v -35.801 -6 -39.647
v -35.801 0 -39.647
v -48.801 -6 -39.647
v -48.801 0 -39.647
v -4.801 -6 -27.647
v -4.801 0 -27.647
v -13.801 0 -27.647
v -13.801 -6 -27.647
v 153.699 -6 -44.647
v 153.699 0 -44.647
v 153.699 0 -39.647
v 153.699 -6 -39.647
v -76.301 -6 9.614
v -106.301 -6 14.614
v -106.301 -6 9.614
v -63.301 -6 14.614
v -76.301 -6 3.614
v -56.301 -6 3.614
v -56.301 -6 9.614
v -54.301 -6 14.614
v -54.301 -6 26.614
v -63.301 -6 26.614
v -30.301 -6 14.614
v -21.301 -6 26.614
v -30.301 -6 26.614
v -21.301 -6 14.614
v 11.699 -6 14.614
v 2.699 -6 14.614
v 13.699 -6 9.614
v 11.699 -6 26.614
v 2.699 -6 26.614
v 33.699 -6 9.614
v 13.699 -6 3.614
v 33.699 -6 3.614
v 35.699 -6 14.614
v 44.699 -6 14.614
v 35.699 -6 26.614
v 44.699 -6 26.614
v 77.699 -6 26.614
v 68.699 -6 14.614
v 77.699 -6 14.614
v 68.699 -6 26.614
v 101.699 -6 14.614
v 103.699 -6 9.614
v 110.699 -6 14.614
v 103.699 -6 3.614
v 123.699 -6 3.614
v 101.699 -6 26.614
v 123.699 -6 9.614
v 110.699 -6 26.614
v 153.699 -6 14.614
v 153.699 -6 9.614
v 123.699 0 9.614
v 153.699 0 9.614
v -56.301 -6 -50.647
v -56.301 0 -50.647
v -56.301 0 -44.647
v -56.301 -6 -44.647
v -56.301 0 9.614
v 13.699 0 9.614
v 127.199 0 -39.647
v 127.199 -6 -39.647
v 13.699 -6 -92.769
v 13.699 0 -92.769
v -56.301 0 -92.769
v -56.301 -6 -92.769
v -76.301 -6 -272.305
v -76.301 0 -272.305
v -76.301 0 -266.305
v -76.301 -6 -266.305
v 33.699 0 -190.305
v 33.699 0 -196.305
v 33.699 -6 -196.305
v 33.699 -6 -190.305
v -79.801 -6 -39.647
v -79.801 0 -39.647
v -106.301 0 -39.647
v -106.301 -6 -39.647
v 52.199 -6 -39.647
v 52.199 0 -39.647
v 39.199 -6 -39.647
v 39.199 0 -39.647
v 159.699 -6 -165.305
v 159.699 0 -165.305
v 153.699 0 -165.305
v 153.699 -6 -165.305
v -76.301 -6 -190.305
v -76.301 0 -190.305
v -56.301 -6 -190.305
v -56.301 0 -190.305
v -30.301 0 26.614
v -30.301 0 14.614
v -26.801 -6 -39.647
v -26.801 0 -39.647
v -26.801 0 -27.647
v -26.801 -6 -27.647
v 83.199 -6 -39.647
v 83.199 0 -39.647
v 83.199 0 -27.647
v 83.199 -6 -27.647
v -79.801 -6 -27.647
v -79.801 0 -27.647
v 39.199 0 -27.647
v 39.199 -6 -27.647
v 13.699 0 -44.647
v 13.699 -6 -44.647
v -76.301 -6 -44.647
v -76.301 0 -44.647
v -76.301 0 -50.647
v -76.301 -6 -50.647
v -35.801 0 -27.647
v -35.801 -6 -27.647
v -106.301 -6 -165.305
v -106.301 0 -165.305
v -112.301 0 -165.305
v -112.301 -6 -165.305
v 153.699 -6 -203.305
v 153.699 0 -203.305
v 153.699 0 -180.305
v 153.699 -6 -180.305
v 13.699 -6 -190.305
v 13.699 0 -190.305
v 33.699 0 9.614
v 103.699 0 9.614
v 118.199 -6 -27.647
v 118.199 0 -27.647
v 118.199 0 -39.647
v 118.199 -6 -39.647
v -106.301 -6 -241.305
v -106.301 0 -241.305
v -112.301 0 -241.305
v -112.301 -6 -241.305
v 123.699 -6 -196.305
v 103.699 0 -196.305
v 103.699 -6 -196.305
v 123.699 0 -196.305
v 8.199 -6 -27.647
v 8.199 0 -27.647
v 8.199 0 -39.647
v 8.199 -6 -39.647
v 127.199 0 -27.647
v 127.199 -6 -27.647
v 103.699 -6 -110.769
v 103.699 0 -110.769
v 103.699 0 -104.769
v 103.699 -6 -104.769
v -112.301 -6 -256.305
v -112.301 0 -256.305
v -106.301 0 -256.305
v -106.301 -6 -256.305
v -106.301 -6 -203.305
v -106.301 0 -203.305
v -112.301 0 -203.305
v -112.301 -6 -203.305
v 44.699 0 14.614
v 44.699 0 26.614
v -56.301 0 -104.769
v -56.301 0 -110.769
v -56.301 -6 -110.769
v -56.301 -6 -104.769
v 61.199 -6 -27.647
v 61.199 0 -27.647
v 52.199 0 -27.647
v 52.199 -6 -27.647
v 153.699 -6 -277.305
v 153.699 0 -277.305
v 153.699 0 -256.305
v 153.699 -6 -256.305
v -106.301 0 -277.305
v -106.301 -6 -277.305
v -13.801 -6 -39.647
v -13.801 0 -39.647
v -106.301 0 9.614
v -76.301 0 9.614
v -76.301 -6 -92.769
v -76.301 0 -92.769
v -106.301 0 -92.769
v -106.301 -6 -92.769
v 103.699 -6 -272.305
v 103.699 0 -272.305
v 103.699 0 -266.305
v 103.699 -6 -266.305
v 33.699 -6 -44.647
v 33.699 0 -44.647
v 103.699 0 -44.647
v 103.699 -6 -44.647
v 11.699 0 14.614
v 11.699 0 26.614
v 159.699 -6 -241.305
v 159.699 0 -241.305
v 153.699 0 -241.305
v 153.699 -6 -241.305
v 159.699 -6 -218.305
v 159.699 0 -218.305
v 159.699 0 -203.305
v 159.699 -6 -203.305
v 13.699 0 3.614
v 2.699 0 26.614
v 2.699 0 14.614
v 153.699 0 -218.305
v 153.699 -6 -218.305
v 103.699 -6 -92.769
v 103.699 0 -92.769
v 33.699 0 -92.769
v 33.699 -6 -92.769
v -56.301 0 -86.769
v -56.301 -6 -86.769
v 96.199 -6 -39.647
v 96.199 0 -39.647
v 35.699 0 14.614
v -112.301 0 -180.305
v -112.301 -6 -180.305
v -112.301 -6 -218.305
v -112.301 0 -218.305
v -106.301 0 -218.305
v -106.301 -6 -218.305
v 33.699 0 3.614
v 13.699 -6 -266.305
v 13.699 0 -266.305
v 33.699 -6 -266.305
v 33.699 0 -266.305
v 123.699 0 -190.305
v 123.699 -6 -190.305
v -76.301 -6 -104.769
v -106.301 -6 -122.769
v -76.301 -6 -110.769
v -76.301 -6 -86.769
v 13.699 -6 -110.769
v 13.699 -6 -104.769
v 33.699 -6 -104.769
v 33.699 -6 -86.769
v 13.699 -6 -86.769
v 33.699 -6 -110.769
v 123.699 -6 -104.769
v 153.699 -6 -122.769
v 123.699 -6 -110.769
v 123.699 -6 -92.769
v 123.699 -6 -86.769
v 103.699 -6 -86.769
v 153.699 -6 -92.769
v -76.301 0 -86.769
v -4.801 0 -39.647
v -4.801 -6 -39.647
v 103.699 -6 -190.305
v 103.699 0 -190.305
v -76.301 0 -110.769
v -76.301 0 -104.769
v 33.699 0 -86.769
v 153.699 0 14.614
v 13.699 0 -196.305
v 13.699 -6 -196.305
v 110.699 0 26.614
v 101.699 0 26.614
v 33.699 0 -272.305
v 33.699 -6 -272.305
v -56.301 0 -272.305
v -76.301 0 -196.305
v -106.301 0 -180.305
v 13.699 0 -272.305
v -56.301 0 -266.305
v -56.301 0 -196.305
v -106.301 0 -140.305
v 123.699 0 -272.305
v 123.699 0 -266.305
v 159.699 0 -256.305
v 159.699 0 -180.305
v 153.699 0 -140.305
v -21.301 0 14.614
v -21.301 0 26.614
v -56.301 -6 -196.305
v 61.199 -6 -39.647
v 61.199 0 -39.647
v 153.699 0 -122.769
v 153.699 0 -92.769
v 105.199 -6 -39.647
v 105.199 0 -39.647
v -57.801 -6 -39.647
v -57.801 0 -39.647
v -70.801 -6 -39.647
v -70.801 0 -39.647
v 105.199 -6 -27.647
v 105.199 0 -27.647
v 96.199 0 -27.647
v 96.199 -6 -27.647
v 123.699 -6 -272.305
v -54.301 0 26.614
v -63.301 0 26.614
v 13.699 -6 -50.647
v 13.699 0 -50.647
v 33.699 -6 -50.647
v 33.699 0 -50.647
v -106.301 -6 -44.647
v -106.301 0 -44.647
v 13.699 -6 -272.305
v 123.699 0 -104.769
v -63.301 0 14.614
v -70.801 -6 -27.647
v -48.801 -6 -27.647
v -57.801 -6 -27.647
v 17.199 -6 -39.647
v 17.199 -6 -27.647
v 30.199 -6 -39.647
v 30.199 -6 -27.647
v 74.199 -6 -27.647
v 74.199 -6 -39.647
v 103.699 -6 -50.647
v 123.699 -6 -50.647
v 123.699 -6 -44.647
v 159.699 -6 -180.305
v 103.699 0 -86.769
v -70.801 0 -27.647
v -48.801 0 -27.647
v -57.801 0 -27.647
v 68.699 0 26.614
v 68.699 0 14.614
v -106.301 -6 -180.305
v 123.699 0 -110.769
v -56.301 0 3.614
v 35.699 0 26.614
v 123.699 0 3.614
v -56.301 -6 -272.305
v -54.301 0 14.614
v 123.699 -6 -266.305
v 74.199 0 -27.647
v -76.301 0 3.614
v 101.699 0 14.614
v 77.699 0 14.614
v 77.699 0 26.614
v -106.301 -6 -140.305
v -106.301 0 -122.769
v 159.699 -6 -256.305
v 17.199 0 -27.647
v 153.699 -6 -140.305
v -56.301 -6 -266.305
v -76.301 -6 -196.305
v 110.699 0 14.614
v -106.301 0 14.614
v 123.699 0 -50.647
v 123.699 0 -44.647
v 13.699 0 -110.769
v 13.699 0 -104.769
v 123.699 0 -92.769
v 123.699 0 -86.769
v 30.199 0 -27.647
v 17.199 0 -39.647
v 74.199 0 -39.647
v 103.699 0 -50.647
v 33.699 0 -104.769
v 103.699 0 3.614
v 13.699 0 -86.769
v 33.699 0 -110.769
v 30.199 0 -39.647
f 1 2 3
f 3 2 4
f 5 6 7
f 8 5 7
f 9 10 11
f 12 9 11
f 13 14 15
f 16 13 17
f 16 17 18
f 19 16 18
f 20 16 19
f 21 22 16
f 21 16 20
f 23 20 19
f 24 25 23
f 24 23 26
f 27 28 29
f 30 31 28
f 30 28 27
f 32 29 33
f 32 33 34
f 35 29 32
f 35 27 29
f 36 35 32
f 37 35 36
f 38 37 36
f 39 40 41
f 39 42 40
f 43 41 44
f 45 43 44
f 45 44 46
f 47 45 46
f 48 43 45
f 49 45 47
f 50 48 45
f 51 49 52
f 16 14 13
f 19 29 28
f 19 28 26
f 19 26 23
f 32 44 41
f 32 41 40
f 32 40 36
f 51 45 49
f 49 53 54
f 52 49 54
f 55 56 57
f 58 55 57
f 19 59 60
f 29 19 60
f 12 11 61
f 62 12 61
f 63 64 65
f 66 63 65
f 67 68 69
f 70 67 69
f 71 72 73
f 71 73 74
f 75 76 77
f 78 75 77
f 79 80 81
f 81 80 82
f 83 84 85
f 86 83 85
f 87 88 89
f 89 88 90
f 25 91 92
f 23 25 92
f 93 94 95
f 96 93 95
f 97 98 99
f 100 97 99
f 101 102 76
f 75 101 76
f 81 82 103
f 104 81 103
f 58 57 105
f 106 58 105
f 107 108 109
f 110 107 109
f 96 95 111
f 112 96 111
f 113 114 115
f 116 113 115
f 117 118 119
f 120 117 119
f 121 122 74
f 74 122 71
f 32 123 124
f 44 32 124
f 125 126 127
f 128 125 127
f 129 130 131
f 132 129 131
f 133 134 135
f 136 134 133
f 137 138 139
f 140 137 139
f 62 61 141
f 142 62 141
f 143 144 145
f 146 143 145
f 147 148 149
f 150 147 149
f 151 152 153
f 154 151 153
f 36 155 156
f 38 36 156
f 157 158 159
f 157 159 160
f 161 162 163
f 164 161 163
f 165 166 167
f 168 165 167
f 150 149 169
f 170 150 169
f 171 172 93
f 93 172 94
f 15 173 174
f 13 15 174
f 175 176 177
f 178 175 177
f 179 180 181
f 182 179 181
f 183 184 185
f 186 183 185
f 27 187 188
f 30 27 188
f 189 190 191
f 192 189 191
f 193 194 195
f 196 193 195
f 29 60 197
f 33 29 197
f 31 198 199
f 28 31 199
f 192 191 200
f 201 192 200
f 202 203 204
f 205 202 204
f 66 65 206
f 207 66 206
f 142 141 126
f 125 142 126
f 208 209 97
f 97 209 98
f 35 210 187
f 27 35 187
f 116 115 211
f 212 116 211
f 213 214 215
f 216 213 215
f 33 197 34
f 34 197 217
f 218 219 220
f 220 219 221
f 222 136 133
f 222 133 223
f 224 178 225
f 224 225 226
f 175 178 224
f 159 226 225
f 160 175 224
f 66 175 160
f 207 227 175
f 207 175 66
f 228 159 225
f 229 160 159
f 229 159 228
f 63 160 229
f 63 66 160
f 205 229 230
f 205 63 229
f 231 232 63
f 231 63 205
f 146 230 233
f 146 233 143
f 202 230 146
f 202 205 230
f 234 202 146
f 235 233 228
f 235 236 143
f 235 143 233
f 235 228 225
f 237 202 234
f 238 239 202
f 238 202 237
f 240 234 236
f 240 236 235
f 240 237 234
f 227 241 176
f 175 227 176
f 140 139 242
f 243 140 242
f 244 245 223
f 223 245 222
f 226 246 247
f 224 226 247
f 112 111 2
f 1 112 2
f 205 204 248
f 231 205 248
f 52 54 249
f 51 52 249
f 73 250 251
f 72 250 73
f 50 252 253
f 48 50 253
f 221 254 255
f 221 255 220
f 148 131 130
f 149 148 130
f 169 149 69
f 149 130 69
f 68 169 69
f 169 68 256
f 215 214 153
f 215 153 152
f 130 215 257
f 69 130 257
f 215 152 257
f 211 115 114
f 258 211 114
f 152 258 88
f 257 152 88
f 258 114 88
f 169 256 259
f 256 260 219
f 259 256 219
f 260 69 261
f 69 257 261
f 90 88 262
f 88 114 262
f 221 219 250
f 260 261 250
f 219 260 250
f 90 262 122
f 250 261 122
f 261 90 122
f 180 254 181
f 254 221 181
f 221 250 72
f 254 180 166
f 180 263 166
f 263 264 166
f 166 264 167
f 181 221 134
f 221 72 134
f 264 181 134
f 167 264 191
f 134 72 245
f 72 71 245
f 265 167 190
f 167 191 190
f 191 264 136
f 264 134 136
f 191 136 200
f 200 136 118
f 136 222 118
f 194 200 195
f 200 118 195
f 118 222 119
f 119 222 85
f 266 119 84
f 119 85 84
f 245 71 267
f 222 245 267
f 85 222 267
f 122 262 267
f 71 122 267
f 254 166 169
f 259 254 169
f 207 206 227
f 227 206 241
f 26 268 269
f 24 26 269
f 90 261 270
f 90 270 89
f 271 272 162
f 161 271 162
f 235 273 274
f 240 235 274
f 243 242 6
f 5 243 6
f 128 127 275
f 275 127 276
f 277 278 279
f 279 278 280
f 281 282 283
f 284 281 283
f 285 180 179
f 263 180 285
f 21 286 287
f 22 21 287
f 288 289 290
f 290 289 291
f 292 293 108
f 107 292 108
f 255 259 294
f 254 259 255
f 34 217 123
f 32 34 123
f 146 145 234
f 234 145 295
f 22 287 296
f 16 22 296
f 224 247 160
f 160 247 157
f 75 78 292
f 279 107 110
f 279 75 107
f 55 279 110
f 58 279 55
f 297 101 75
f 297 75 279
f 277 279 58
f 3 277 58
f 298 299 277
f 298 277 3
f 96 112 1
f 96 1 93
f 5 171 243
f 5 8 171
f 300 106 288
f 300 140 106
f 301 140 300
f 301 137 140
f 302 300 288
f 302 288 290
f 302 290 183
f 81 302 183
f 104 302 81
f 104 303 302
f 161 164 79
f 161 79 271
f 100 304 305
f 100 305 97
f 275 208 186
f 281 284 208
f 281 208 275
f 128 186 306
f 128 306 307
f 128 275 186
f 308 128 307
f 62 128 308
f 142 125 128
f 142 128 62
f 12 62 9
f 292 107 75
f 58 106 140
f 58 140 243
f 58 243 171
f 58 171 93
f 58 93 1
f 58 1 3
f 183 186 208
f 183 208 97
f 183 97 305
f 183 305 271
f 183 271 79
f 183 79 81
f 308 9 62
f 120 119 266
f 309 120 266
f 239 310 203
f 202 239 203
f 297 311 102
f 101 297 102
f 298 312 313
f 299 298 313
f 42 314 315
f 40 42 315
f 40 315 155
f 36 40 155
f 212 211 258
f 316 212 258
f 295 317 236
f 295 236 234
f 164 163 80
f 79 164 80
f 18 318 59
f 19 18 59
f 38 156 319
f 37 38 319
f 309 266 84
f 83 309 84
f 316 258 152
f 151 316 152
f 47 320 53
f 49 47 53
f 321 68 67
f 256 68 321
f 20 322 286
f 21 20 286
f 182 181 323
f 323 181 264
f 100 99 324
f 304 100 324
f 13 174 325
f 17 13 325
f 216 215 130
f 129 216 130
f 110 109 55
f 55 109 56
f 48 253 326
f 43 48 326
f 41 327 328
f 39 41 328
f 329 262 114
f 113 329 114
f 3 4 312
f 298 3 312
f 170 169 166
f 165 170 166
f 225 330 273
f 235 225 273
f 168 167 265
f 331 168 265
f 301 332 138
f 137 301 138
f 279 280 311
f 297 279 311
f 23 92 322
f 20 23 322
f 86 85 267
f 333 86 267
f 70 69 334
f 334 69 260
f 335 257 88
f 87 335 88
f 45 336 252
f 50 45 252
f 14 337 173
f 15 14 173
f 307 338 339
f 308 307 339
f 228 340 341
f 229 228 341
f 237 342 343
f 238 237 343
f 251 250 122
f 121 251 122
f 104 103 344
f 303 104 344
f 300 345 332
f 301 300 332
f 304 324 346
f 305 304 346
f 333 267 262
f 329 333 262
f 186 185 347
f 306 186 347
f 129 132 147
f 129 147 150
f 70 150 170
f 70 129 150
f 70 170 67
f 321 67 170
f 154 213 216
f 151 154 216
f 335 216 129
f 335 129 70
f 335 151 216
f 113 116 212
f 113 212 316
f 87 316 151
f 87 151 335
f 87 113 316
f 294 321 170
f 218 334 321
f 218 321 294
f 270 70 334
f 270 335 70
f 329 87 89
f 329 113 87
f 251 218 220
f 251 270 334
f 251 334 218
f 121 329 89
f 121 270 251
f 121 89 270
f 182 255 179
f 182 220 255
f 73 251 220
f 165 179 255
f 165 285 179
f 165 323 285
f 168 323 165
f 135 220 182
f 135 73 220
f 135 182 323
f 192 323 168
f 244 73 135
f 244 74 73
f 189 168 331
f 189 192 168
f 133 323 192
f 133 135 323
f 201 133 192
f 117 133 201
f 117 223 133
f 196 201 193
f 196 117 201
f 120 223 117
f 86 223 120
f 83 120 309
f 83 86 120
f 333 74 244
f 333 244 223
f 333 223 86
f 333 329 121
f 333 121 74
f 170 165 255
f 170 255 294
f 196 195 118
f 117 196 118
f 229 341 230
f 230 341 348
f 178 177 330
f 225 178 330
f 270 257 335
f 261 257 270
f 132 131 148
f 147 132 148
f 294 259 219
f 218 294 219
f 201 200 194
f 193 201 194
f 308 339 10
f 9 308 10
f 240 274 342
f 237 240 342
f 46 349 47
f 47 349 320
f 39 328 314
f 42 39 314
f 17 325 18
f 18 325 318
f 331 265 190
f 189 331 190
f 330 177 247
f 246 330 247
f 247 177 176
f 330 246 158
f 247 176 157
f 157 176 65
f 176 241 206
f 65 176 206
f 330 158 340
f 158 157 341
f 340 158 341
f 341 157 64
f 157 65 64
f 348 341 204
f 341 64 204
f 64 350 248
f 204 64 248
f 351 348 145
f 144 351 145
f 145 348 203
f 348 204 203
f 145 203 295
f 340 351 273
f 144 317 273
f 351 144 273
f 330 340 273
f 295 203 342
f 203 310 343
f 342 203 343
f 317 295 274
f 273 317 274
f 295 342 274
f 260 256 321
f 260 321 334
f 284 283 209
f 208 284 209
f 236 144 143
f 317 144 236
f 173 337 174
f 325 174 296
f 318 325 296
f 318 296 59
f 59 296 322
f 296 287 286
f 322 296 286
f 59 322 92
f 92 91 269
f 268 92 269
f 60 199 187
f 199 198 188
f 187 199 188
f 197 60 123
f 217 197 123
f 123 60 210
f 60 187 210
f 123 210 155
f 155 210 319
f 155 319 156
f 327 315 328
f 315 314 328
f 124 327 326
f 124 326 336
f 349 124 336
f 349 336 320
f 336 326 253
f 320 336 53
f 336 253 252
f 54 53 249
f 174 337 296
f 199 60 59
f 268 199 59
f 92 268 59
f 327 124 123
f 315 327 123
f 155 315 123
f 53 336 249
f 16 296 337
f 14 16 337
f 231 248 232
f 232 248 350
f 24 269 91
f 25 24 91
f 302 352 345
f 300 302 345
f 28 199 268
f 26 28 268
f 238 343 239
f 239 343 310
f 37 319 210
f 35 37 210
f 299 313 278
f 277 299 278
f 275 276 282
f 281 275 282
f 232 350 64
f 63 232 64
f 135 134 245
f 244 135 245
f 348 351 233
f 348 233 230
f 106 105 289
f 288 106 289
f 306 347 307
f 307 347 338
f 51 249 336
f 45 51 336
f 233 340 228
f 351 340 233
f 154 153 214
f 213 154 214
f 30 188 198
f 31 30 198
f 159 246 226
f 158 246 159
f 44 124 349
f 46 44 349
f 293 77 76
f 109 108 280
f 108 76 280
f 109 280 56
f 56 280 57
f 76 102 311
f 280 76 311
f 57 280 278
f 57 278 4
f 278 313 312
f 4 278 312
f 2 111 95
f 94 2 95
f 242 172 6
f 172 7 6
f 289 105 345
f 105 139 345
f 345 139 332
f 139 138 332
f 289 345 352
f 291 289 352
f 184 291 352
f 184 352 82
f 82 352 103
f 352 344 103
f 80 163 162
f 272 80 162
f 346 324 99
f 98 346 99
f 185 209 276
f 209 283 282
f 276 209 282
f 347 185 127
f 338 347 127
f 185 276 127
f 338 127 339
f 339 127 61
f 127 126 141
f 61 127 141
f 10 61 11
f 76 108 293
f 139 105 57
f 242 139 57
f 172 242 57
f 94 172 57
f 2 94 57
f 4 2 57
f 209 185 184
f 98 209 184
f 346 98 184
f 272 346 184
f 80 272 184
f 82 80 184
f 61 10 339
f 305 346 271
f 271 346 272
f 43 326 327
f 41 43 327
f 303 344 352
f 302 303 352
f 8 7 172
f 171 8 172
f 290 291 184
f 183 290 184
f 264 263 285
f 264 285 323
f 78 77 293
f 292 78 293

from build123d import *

# Parameters (mm, degrees)
F0_W     = 20
F0_H     = 6
F1_DEPTH = 6
F2_DEPTH = 6
F3_DEPTH = 6
F4_DEPTH = 6


# Not quite as in the source:
# - a feature names something its author has since deleted; it is built from what else it names


with BuildPart() as f1:
    # F0 (on Front) → F1 (new body)
    with BuildSketch(Plane.XZ):
        Polygon((153.699216228, -140.3053558618), (-106.300783772, -140.3053558618), (-106.300783772, -165.3053558618), (-112.300783772, -165.3053558618), (-112.300783772, -180.3053558618), (-106.300783772, -180.3053558618), (-106.300783772, -203.3053558618), (-112.300783772, -203.3053558618), (-112.300783772, -218.3053558618), (-106.300783772, -218.3053558618), (-106.300783772, -241.3053558618), (-112.300783772, -241.3053558618), (-112.300783772, -256.3053558618), (-106.300783772, -256.3053558618), (-106.300783772, -277.3053558618), (153.699216228, -277.3053558618), (153.699216228, -256.3053558618), (159.699216228, -256.3053558618), (159.699216228, -241.3053558618), (153.699216228, -241.3053558618), (153.699216228, -218.3053558618), (159.699216228, -218.3053558618), (159.699216228, -203.3053558618), (153.699216228, -203.3053558618), (153.699216228, -180.3053558618), (159.699216228, -180.3053558618), (159.699216228, -165.3053558618), (153.699216228, -165.3053558618), align=None)
        with Locations((-66.300783772, -269.3053558618)):
            Rectangle(F0_W, F0_H, mode=Mode.SUBTRACT)
        with Locations((-66.300783772, -193.3053558618)):
            Rectangle(F0_W, F0_H, mode=Mode.SUBTRACT)
        with Locations((23.699216228, -193.3053558618)):
            Rectangle(F0_W, F0_H, mode=Mode.SUBTRACT)
        with Locations((23.699216228, -269.3053558618)):
            Rectangle(F0_W, F0_H, mode=Mode.SUBTRACT)
        with Locations((113.699216228, -269.3053558618)):
            Rectangle(F0_W, F0_H, mode=Mode.SUBTRACT)
        with Locations((113.699216228, -193.3053558618)):
            Rectangle(F0_W, F0_H, mode=Mode.SUBTRACT)
    extrude(amount=F1_DEPTH)


with BuildPart() as f2:
    # F0 (on Front) → F2 (new body)
    with BuildSketch(Plane.XZ):
        Polygon((-76.300783772, -92.7685894072), (-106.300783772, -92.7685894072), (-106.300783772, -122.7685894072), (153.699216228, -122.7685894072), (153.699216228, -92.7685894072), (123.699216228, -92.7685894072), (123.699216228, -86.7685894072), (103.699216228, -86.7685894072), (103.699216228, -92.7685894072), (33.699216228, -92.7685894072), (33.699216228, -86.7685894072), (13.699216228, -86.7685894072), (13.699216228, -92.7685894072), (-56.300783772, -92.7685894072), (-56.300783772, -86.7685894072), (-76.300783772, -86.7685894072), align=None)
        with Locations((-66.300783772, -107.7685894072)):
            Rectangle(F0_W, F0_H, mode=Mode.SUBTRACT)
        with Locations((23.699216228, -107.7685894072)):
            Rectangle(F0_W, F0_H, mode=Mode.SUBTRACT)
        with Locations((113.699216228, -107.7685894072)):
            Rectangle(F0_W, F0_H, mode=Mode.SUBTRACT)
    extrude(amount=F2_DEPTH)


with BuildPart() as f3:
    # F0 (on Front) → F3 (new body)
    with BuildSketch(Plane.XZ):
        Polygon((-63.300783772, 26.6136842668), (-63.300783772, 14.6136842668), (-106.300783772, 14.6136842668), (-106.300783772, 9.6136842668), (-76.300783772, 9.6136842668), (-76.300783772, 3.6136842668), (-56.300783772, 3.6136842668), (-56.300783772, 9.6136842668), (13.699216228, 9.6136842668), (13.699216228, 3.6136842668), (33.699216228, 3.6136842668), (33.699216228, 9.6136842668), (103.699216228, 9.6136842668), (103.699216228, 3.6136842668), (123.699216228, 3.6136842668), (123.699216228, 9.6136842668), (153.699216228, 9.6136842668), (153.699216228, 14.6136842668), (134.699216228, 14.6136842668), (110.699216228, 14.6136842668), (110.699216228, 26.6136842668), (101.699216228, 26.6136842668), (101.699216228, 14.6136842668), (77.699216228, 14.6136842668), (77.699216228, 26.6136842668), (68.699216228, 26.6136842668), (68.699216228, 14.6136842668), (44.699216228, 14.6136842668), (44.699216228, 26.6136842668), (35.699216228, 26.6136842668), (35.699216228, 14.6136842668), (11.699216228, 14.6136842668), (11.699216228, 26.6136842668), (2.699216228, 26.6136842668), (2.699216228, 14.6136842668), (-21.300783772, 14.6136842668), (-21.300783772, 26.6136842668), (-30.300783772, 26.6136842668), (-30.300783772, 14.6136842668), (-54.300783772, 14.6136842668), (-54.300783772, 26.6136842668), align=None)
    extrude(amount=F3_DEPTH)


with BuildPart() as f4:
    # F0 (on Front) → F4 (new body)
    with BuildSketch(Plane.XZ):
        Polygon((-79.800783772, -27.6473498154), (-79.800783772, -39.6473498154), (-106.300783772, -39.6473498154), (-106.300783772, -44.6473498154), (-76.300783772, -44.6473498154), (-76.300783772, -50.6473498154), (-56.300783772, -50.6473498154), (-56.300783772, -44.6473498154), (13.699216228, -44.6473498154), (13.699216228, -50.6473498154), (33.699216228, -50.6473498154), (33.699216228, -44.6473498154), (103.699216228, -44.6473498154), (103.699216228, -50.6473498154), (123.699216228, -50.6473498154), (123.699216228, -44.6473498154), (153.699216228, -44.6473498154), (153.699216228, -39.6473498154), (140.199216228, -39.6473498154), (127.199216228, -39.6473498154), (127.199216228, -27.6473498154), (118.199216228, -27.6473498154), (118.199216228, -39.6473498154), (105.199216228, -39.6473498154), (105.199216228, -27.6473498154), (96.199216228, -27.6473498154), (96.199216228, -39.6473498154), (83.199216228, -39.6473498154), (83.199216228, -27.6473498154), (74.199216228, -27.6473498154), (74.199216228, -39.6473498154), (61.199216228, -39.6473498154), (61.199216228, -27.6473498154), (52.199216228, -27.6473498154), (52.199216228, -39.6473498154), (39.199216228, -39.6473498154), (39.199216228, -27.6473498154), (30.199216228, -27.6473498154), (30.199216228, -39.6473498154), (17.199216228, -39.6473498154), (17.199216228, -27.6473498154), (8.199216228, -27.6473498154), (8.199216228, -39.6473498154), (-4.800783772, -39.6473498154), (-4.800783772, -27.6473498154), (-13.800783772, -27.6473498154), (-13.800783772, -39.6473498154), (-26.800783772, -39.6473498154), (-26.800783772, -27.6473498154), (-35.800783772, -27.6473498154), (-35.800783772, -39.6473498154), (-48.800783772, -39.6473498154), (-48.800783772, -27.6473498154), (-57.800783772, -27.6473498154), (-57.800783772, -39.6473498154), (-70.800783772, -39.6473498154), (-70.800783772, -27.6473498154), align=None)
    extrude(amount=F4_DEPTH)


solid = Compound([f1.part, f2.part, f3.part, f4.part])
